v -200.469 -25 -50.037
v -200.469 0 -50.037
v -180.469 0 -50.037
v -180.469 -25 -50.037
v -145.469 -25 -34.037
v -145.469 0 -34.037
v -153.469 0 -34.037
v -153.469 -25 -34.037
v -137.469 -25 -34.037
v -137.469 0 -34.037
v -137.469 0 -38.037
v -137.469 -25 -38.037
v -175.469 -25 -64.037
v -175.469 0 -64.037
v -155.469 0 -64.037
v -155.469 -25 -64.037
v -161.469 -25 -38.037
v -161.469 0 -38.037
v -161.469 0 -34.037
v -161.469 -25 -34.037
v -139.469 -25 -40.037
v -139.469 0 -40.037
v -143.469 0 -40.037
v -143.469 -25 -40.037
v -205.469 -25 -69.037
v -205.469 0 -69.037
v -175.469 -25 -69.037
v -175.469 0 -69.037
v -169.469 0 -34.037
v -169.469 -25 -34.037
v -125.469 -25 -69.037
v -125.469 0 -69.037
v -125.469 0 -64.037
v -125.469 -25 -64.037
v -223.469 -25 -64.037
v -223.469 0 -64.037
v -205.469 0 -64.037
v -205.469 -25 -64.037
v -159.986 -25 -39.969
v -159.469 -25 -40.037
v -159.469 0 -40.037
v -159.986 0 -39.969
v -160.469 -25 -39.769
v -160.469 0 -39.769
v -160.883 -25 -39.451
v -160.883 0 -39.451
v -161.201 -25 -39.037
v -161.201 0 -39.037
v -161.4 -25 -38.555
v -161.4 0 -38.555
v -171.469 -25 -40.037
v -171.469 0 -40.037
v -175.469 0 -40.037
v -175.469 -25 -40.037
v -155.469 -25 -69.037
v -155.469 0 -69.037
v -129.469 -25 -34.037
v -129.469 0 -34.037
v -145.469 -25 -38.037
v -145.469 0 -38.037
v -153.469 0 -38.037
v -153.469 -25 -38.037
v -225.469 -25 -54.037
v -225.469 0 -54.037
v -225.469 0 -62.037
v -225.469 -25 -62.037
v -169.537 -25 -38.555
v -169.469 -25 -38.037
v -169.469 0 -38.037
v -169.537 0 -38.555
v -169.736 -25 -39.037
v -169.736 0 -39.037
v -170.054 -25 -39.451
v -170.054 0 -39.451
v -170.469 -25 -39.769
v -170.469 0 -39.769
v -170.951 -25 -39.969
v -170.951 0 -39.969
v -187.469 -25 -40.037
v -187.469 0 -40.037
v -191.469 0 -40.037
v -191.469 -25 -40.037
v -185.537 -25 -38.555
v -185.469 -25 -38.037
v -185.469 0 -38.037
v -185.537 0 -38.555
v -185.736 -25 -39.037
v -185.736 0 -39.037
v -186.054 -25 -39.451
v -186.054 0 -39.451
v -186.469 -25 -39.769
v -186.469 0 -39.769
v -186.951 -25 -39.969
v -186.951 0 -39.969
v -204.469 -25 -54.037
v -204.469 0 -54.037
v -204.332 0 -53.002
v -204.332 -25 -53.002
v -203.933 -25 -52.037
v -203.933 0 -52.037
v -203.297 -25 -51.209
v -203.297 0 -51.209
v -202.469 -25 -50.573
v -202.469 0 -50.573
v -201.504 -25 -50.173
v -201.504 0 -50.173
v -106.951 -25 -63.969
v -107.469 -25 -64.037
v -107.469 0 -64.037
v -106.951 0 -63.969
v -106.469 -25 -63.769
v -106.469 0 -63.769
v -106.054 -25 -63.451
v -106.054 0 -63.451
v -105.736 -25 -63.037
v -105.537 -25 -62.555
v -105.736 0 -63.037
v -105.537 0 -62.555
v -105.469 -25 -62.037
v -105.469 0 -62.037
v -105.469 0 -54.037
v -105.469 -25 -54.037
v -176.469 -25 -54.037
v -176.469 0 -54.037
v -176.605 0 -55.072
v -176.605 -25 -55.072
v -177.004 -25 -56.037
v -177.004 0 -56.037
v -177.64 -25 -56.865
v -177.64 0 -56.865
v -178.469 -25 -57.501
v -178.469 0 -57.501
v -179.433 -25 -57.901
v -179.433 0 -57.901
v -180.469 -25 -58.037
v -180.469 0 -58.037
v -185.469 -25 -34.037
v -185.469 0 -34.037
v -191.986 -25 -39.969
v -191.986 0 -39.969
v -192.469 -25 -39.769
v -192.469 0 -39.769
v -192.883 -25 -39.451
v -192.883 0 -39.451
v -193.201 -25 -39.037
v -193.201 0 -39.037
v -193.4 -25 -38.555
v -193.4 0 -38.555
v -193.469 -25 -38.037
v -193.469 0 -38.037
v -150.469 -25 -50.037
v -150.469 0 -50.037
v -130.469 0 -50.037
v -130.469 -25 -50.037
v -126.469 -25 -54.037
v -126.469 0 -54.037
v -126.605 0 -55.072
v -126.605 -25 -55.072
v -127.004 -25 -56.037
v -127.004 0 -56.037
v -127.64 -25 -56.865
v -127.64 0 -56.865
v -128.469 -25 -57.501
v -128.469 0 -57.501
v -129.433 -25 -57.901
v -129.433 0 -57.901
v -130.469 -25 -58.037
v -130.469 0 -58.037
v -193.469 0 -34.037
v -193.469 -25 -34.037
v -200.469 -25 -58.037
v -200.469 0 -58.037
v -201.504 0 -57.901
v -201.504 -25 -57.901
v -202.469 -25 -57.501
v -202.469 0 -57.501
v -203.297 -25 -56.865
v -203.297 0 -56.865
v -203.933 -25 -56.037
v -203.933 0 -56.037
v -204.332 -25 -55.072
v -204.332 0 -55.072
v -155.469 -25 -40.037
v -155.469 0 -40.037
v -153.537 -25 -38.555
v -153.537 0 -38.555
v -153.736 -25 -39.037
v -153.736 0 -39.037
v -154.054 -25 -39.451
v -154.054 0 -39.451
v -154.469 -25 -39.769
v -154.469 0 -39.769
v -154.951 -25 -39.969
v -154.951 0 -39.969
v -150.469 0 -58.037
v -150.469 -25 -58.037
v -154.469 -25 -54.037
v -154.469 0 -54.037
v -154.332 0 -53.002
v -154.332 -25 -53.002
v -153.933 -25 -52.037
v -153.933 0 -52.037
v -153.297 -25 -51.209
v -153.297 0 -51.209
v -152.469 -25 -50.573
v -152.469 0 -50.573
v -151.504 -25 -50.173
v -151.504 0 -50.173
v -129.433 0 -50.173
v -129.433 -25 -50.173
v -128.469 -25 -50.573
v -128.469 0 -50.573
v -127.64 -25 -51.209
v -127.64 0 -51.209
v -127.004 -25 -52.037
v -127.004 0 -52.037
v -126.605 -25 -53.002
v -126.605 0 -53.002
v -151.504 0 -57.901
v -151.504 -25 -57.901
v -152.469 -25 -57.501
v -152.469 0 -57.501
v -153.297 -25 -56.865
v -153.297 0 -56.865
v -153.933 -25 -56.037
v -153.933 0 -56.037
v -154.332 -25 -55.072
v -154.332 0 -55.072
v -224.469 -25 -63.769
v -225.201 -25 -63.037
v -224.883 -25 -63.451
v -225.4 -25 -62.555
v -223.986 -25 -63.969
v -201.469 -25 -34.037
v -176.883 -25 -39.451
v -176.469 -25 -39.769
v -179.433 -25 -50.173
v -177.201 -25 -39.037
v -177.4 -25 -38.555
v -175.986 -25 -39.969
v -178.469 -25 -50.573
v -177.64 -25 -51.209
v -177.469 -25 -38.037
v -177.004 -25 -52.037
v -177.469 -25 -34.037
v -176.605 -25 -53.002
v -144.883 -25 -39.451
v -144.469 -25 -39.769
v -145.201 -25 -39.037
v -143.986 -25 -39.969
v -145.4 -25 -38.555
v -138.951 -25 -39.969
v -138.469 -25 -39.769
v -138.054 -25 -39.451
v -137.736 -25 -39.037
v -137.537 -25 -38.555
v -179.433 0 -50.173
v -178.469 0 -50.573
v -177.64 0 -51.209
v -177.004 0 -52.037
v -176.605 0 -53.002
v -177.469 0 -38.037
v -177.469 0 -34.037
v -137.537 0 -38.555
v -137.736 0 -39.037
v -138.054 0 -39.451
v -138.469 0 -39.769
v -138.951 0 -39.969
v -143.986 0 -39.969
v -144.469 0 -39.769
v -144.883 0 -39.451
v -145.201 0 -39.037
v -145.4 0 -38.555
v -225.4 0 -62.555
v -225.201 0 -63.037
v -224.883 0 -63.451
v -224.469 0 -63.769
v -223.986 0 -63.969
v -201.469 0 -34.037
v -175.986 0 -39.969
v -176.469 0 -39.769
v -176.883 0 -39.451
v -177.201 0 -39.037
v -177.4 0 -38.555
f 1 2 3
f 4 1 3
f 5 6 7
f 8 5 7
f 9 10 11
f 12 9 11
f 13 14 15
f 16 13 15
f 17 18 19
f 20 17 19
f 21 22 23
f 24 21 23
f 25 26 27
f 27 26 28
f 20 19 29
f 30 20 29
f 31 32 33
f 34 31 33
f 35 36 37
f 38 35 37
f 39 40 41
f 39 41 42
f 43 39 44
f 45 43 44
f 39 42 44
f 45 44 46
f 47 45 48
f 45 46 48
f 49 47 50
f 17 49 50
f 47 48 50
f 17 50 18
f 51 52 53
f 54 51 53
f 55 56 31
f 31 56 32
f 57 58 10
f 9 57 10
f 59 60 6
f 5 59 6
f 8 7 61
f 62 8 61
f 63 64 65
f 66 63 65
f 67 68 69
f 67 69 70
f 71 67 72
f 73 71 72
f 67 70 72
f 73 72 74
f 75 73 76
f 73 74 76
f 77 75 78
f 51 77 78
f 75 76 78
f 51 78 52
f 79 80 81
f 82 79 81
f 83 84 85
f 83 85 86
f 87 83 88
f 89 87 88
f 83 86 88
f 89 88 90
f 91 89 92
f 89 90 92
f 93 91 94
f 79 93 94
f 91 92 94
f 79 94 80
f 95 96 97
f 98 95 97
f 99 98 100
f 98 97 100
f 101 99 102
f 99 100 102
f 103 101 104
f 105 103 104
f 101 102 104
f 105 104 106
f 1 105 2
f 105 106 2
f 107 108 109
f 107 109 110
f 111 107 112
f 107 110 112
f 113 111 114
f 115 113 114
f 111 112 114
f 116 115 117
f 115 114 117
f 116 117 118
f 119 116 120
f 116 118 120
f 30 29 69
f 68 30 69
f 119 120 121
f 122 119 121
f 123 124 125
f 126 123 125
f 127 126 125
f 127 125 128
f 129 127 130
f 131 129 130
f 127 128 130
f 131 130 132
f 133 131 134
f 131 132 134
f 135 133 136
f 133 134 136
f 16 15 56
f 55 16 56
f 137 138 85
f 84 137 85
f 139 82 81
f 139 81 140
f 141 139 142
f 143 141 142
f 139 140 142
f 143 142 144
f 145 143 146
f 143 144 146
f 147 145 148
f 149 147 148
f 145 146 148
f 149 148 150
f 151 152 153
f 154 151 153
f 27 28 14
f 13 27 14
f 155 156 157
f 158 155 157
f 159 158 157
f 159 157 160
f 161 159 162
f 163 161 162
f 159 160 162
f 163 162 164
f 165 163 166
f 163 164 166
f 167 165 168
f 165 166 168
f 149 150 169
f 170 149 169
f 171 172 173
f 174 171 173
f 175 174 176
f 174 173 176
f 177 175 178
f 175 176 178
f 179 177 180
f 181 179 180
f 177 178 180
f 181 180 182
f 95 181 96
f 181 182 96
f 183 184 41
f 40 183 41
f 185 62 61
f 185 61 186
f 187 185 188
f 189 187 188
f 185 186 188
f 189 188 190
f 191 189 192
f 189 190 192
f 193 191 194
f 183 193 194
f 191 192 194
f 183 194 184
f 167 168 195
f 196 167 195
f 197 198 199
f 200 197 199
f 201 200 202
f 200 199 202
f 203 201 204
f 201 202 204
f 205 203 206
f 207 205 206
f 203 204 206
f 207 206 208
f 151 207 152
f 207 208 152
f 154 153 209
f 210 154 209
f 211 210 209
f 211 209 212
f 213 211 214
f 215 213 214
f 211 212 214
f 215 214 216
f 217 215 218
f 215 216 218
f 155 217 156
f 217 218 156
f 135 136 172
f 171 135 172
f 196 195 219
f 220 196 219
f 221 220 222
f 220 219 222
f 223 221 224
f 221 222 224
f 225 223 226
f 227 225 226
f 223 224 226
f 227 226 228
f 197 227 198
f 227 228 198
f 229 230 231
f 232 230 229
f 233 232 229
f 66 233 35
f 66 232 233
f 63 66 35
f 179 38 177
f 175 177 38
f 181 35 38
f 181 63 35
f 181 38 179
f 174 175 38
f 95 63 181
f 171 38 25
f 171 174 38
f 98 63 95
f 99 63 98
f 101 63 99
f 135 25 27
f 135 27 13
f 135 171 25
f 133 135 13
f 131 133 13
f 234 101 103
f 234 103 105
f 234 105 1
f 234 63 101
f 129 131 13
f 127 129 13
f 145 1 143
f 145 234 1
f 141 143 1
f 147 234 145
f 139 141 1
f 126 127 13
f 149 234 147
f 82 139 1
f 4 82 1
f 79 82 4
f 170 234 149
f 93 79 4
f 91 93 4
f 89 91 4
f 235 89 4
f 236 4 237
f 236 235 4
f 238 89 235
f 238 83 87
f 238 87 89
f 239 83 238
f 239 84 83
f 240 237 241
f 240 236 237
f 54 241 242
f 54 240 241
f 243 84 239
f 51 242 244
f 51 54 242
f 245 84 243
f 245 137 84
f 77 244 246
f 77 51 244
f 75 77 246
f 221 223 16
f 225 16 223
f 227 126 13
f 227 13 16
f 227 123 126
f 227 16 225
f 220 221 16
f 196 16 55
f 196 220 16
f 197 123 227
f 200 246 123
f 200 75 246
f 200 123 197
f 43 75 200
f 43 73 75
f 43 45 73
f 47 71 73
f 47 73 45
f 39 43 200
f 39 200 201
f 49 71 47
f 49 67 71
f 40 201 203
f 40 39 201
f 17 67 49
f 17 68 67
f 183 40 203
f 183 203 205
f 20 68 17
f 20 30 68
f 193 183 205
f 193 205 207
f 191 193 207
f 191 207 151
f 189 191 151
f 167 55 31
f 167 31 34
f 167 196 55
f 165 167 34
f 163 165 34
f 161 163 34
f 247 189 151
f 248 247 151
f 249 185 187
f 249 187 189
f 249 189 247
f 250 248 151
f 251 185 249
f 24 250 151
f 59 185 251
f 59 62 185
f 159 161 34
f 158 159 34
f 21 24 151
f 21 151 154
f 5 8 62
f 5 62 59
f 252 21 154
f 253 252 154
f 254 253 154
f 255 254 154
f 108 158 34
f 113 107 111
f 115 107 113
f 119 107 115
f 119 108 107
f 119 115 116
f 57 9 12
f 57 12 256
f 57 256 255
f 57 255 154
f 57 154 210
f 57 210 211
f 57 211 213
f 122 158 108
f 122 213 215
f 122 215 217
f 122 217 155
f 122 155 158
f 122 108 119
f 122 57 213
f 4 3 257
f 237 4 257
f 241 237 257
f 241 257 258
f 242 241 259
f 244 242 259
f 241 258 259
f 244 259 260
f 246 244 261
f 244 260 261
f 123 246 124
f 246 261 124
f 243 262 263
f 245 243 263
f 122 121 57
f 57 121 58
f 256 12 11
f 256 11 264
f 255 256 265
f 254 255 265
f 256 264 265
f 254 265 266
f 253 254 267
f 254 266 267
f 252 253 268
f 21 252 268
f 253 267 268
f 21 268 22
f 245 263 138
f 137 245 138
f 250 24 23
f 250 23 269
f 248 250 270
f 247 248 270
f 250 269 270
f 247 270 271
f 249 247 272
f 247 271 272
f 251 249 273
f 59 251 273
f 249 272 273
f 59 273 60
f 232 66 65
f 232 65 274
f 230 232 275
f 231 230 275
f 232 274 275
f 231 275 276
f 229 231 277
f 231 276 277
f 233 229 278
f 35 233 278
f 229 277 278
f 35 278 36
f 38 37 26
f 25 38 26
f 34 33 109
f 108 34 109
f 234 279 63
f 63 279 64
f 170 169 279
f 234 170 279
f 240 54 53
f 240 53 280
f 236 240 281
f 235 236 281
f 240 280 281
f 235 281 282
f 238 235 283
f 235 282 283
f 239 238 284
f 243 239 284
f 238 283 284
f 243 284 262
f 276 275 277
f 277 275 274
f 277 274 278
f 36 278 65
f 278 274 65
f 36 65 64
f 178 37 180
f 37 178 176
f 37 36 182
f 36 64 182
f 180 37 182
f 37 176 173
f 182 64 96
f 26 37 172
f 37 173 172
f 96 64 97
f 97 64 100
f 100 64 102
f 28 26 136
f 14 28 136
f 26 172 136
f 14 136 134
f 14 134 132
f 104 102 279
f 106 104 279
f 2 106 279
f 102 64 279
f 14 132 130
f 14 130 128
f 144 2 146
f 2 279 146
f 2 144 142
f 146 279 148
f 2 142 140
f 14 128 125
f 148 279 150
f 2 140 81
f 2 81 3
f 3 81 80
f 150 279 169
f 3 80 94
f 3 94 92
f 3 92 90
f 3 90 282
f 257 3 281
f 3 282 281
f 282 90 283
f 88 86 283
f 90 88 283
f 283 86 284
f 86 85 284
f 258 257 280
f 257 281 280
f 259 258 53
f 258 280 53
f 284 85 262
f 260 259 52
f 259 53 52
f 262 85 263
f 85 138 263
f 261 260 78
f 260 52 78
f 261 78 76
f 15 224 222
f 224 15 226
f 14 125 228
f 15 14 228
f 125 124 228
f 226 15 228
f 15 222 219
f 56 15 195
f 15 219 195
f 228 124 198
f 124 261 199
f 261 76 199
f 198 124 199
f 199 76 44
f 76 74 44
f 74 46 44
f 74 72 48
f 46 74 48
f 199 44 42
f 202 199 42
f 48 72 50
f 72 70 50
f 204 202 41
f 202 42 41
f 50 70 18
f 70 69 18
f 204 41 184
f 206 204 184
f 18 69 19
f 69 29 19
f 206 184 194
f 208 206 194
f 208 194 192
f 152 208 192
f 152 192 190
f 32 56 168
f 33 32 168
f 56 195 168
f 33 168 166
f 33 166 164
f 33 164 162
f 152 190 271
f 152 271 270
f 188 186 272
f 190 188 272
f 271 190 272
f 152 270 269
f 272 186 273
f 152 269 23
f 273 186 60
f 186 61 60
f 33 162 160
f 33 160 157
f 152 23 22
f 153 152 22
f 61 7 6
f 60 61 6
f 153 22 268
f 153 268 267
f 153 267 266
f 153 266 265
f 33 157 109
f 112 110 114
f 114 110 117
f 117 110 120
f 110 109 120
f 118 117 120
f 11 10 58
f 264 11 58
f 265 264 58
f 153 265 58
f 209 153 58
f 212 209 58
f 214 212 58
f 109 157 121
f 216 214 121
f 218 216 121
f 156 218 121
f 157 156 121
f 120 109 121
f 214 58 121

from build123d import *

# Parameters (mm, degrees)
F1_DEPTH = 25


with BuildPart() as f1:
    # F0 (on Front) → F1 (new body)
    with BuildSketch(Plane.XZ):
        with BuildLine():
            ThreePointArc((-225.4685461521, -62.0369579196), (-224.8827597145, -63.451171482), (-223.4685461521, -64.0369579196))
            Line((-223.4685461521, -64.0369579196), (-205.4685461521, -64.0369579196))
            Line((-205.4685461521, -64.0369579196), (-205.4685461521, -69.0369579196))
            Line((-205.4685461521, -69.0369579196), (-175.4685461521, -69.0369579196))
            Line((-175.4685461521, -69.0369579196), (-175.4685461521, -64.0369579196))
            Line((-175.4685461521, -64.0369579196), (-165.4685461521, -64.0369579196))
            Line((-165.4685461521, -64.0369579196), (-165.4685461521, -54.0369579196))
            Line((-165.4685461521, -54.0369579196), (-165.4685461521, -34.0369579196))
            Line((-165.4685461521, -34.0369579196), (-169.4685461521, -34.0369579196))
            Line((-169.4685461521, -34.0369579196), (-169.4685461521, -38.0369579196))
            ThreePointArc((-169.4685461521, -38.0369579196), (-170.0543325897, -39.451171482), (-171.4685461521, -40.0369579196))
            Line((-171.4685461521, -40.0369579196), (-175.4685461521, -40.0369579196))
            ThreePointArc((-175.4685461521, -40.0369579196), (-176.8827597145, -39.451171482), (-177.4685461521, -38.0369579196))
            Line((-177.4685461521, -38.0369579196), (-177.4685461521, -34.0369579196))
            Line((-177.4685461521, -34.0369579196), (-185.4685461521, -34.0369579196))
            Line((-185.4685461521, -34.0369579196), (-185.4685461521, -38.0369579196))
            ThreePointArc((-185.4685461521, -38.0369579196), (-186.0543325897, -39.451171482), (-187.4685461521, -40.0369579196))
            Line((-187.4685461521, -40.0369579196), (-191.4685461521, -40.0369579196))
            ThreePointArc((-191.4685461521, -40.0369579196), (-192.8827597145, -39.451171482), (-193.4685461521, -38.0369579196))
            Line((-193.4685461521, -38.0369579196), (-193.4685461521, -34.0369579196))
            Line((-193.4685461521, -34.0369579196), (-201.4685461521, -34.0369579196))
            Line((-201.4685461521, -34.0369579196), (-225.4685461521, -54.0369579196))
            Line((-225.4685461521, -54.0369579196), (-225.4685461521, -62.0369579196))
        make_face()
        with BuildLine():
            ThreePointArc((-180.4685461521, -50.0369579196), (-177.6401190274, -51.2085307949), (-176.4685461521, -54.0369579196))
            ThreePointArc((-176.4685461521, -54.0369579196), (-177.6401190274, -56.8653850443), (-180.4685461521, -58.0369579196))
            Line((-180.4685461521, -58.0369579196), (-200.4685461521, -58.0369579196))
            ThreePointArc((-200.4685461521, -58.0369579196), (-203.2969732769, -56.8653850443), (-204.4685461521, -54.0369579196))
            ThreePointArc((-204.4685461521, -54.0369579196), (-203.2969732769, -51.2085307949), (-200.4685461521, -50.0369579196))
            Line((-200.4685461521, -50.0369579196), (-180.4685461521, -50.0369579196))
        make_face(mode=Mode.SUBTRACT)
        with BuildLine():
            Line((-165.4685461521, -34.0369579196), (-165.4685461521, -54.0369579196))
            Line((-165.4685461521, -54.0369579196), (-154.4685461521, -54.0369579196))
            ThreePointArc((-154.4685461521, -54.0369579196), (-153.2969732769, -51.2085307949), (-150.4685461521, -50.0369579196))
            Line((-150.4685461521, -50.0369579196), (-130.4685461521, -50.0369579196))
            ThreePointArc((-130.4685461521, -50.0369579196), (-127.6401190274, -51.2085307949), (-126.4685461521, -54.0369579196))
            ThreePointArc((-126.4685461521, -54.0369579196), (-127.6401190274, -56.8653850443), (-130.4685461521, -58.0369579196))
            Line((-130.4685461521, -58.0369579196), (-140.4685461521, -58.0369579196))
            Line((-140.4685461521, -58.0369579196), (-140.4685461521, -69.0369579196))
            Line((-140.4685461521, -69.0369579196), (-125.4685461521, -69.0369579196))
            Line((-125.4685461521, -69.0369579196), (-125.4685461521, -64.0369579196))
            Line((-125.4685461521, -64.0369579196), (-107.4685461521, -64.0369579196))
            ThreePointArc((-107.4685461521, -64.0369579196), (-106.0543325897, -63.451171482), (-105.4685461521, -62.0369579196))
            Line((-105.4685461521, -62.0369579196), (-105.4685461521, -54.0369579196))
            Line((-105.4685461521, -54.0369579196), (-129.4685461521, -34.0369579196))
            Line((-129.4685461521, -34.0369579196), (-137.4685461521, -34.0369579196))
            Line((-137.4685461521, -34.0369579196), (-137.4685461521, -38.0369579196))
            ThreePointArc((-137.4685461521, -38.0369579196), (-138.0543325897, -39.451171482), (-139.4685461521, -40.0369579196))
            Line((-139.4685461521, -40.0369579196), (-143.4685461521, -40.0369579196))
            ThreePointArc((-143.4685461521, -40.0369579196), (-144.8827597145, -39.451171482), (-145.4685461521, -38.0369579196))
            Line((-145.4685461521, -38.0369579196), (-145.4685461521, -34.0369579196))
            Line((-145.4685461521, -34.0369579196), (-153.4685461521, -34.0369579196))
            Line((-153.4685461521, -34.0369579196), (-153.4685461521, -38.0369579196))
            ThreePointArc((-153.4685461521, -38.0369579196), (-154.0543325897, -39.451171482), (-155.4685461521, -40.0369579196))
            Line((-155.4685461521, -40.0369579196), (-159.4685461521, -40.0369579196))
            ThreePointArc((-159.4685461521, -40.0369579196), (-160.8827597145, -39.451171482), (-161.4685461521, -38.0369579196))
            Line((-161.4685461521, -38.0369579196), (-161.4685461521, -34.0369579196))
            Line((-161.4685461521, -34.0369579196), (-165.4685461521, -34.0369579196))
        make_face()
        with BuildLine():
            Line((-165.4685461521, -54.0369579196), (-165.4685461521, -64.0369579196))
            Line((-165.4685461521, -64.0369579196), (-155.4685461521, -64.0369579196))
            Line((-155.4685461521, -64.0369579196), (-155.4685461521, -69.0369579196))
            Line((-155.4685461521, -69.0369579196), (-140.4685461521, -69.0369579196))
            Line((-140.4685461521, -69.0369579196), (-140.4685461521, -58.0369579196))
            Line((-140.4685461521, -58.0369579196), (-150.4685461521, -58.0369579196))
            ThreePointArc((-150.4685461521, -58.0369579196), (-153.2969732769, -56.8653850443), (-154.4685461521, -54.0369579196))
            Line((-154.4685461521, -54.0369579196), (-165.4685461521, -54.0369579196))
        make_face()
    extrude(amount=F1_DEPTH)


solid = f1.part
